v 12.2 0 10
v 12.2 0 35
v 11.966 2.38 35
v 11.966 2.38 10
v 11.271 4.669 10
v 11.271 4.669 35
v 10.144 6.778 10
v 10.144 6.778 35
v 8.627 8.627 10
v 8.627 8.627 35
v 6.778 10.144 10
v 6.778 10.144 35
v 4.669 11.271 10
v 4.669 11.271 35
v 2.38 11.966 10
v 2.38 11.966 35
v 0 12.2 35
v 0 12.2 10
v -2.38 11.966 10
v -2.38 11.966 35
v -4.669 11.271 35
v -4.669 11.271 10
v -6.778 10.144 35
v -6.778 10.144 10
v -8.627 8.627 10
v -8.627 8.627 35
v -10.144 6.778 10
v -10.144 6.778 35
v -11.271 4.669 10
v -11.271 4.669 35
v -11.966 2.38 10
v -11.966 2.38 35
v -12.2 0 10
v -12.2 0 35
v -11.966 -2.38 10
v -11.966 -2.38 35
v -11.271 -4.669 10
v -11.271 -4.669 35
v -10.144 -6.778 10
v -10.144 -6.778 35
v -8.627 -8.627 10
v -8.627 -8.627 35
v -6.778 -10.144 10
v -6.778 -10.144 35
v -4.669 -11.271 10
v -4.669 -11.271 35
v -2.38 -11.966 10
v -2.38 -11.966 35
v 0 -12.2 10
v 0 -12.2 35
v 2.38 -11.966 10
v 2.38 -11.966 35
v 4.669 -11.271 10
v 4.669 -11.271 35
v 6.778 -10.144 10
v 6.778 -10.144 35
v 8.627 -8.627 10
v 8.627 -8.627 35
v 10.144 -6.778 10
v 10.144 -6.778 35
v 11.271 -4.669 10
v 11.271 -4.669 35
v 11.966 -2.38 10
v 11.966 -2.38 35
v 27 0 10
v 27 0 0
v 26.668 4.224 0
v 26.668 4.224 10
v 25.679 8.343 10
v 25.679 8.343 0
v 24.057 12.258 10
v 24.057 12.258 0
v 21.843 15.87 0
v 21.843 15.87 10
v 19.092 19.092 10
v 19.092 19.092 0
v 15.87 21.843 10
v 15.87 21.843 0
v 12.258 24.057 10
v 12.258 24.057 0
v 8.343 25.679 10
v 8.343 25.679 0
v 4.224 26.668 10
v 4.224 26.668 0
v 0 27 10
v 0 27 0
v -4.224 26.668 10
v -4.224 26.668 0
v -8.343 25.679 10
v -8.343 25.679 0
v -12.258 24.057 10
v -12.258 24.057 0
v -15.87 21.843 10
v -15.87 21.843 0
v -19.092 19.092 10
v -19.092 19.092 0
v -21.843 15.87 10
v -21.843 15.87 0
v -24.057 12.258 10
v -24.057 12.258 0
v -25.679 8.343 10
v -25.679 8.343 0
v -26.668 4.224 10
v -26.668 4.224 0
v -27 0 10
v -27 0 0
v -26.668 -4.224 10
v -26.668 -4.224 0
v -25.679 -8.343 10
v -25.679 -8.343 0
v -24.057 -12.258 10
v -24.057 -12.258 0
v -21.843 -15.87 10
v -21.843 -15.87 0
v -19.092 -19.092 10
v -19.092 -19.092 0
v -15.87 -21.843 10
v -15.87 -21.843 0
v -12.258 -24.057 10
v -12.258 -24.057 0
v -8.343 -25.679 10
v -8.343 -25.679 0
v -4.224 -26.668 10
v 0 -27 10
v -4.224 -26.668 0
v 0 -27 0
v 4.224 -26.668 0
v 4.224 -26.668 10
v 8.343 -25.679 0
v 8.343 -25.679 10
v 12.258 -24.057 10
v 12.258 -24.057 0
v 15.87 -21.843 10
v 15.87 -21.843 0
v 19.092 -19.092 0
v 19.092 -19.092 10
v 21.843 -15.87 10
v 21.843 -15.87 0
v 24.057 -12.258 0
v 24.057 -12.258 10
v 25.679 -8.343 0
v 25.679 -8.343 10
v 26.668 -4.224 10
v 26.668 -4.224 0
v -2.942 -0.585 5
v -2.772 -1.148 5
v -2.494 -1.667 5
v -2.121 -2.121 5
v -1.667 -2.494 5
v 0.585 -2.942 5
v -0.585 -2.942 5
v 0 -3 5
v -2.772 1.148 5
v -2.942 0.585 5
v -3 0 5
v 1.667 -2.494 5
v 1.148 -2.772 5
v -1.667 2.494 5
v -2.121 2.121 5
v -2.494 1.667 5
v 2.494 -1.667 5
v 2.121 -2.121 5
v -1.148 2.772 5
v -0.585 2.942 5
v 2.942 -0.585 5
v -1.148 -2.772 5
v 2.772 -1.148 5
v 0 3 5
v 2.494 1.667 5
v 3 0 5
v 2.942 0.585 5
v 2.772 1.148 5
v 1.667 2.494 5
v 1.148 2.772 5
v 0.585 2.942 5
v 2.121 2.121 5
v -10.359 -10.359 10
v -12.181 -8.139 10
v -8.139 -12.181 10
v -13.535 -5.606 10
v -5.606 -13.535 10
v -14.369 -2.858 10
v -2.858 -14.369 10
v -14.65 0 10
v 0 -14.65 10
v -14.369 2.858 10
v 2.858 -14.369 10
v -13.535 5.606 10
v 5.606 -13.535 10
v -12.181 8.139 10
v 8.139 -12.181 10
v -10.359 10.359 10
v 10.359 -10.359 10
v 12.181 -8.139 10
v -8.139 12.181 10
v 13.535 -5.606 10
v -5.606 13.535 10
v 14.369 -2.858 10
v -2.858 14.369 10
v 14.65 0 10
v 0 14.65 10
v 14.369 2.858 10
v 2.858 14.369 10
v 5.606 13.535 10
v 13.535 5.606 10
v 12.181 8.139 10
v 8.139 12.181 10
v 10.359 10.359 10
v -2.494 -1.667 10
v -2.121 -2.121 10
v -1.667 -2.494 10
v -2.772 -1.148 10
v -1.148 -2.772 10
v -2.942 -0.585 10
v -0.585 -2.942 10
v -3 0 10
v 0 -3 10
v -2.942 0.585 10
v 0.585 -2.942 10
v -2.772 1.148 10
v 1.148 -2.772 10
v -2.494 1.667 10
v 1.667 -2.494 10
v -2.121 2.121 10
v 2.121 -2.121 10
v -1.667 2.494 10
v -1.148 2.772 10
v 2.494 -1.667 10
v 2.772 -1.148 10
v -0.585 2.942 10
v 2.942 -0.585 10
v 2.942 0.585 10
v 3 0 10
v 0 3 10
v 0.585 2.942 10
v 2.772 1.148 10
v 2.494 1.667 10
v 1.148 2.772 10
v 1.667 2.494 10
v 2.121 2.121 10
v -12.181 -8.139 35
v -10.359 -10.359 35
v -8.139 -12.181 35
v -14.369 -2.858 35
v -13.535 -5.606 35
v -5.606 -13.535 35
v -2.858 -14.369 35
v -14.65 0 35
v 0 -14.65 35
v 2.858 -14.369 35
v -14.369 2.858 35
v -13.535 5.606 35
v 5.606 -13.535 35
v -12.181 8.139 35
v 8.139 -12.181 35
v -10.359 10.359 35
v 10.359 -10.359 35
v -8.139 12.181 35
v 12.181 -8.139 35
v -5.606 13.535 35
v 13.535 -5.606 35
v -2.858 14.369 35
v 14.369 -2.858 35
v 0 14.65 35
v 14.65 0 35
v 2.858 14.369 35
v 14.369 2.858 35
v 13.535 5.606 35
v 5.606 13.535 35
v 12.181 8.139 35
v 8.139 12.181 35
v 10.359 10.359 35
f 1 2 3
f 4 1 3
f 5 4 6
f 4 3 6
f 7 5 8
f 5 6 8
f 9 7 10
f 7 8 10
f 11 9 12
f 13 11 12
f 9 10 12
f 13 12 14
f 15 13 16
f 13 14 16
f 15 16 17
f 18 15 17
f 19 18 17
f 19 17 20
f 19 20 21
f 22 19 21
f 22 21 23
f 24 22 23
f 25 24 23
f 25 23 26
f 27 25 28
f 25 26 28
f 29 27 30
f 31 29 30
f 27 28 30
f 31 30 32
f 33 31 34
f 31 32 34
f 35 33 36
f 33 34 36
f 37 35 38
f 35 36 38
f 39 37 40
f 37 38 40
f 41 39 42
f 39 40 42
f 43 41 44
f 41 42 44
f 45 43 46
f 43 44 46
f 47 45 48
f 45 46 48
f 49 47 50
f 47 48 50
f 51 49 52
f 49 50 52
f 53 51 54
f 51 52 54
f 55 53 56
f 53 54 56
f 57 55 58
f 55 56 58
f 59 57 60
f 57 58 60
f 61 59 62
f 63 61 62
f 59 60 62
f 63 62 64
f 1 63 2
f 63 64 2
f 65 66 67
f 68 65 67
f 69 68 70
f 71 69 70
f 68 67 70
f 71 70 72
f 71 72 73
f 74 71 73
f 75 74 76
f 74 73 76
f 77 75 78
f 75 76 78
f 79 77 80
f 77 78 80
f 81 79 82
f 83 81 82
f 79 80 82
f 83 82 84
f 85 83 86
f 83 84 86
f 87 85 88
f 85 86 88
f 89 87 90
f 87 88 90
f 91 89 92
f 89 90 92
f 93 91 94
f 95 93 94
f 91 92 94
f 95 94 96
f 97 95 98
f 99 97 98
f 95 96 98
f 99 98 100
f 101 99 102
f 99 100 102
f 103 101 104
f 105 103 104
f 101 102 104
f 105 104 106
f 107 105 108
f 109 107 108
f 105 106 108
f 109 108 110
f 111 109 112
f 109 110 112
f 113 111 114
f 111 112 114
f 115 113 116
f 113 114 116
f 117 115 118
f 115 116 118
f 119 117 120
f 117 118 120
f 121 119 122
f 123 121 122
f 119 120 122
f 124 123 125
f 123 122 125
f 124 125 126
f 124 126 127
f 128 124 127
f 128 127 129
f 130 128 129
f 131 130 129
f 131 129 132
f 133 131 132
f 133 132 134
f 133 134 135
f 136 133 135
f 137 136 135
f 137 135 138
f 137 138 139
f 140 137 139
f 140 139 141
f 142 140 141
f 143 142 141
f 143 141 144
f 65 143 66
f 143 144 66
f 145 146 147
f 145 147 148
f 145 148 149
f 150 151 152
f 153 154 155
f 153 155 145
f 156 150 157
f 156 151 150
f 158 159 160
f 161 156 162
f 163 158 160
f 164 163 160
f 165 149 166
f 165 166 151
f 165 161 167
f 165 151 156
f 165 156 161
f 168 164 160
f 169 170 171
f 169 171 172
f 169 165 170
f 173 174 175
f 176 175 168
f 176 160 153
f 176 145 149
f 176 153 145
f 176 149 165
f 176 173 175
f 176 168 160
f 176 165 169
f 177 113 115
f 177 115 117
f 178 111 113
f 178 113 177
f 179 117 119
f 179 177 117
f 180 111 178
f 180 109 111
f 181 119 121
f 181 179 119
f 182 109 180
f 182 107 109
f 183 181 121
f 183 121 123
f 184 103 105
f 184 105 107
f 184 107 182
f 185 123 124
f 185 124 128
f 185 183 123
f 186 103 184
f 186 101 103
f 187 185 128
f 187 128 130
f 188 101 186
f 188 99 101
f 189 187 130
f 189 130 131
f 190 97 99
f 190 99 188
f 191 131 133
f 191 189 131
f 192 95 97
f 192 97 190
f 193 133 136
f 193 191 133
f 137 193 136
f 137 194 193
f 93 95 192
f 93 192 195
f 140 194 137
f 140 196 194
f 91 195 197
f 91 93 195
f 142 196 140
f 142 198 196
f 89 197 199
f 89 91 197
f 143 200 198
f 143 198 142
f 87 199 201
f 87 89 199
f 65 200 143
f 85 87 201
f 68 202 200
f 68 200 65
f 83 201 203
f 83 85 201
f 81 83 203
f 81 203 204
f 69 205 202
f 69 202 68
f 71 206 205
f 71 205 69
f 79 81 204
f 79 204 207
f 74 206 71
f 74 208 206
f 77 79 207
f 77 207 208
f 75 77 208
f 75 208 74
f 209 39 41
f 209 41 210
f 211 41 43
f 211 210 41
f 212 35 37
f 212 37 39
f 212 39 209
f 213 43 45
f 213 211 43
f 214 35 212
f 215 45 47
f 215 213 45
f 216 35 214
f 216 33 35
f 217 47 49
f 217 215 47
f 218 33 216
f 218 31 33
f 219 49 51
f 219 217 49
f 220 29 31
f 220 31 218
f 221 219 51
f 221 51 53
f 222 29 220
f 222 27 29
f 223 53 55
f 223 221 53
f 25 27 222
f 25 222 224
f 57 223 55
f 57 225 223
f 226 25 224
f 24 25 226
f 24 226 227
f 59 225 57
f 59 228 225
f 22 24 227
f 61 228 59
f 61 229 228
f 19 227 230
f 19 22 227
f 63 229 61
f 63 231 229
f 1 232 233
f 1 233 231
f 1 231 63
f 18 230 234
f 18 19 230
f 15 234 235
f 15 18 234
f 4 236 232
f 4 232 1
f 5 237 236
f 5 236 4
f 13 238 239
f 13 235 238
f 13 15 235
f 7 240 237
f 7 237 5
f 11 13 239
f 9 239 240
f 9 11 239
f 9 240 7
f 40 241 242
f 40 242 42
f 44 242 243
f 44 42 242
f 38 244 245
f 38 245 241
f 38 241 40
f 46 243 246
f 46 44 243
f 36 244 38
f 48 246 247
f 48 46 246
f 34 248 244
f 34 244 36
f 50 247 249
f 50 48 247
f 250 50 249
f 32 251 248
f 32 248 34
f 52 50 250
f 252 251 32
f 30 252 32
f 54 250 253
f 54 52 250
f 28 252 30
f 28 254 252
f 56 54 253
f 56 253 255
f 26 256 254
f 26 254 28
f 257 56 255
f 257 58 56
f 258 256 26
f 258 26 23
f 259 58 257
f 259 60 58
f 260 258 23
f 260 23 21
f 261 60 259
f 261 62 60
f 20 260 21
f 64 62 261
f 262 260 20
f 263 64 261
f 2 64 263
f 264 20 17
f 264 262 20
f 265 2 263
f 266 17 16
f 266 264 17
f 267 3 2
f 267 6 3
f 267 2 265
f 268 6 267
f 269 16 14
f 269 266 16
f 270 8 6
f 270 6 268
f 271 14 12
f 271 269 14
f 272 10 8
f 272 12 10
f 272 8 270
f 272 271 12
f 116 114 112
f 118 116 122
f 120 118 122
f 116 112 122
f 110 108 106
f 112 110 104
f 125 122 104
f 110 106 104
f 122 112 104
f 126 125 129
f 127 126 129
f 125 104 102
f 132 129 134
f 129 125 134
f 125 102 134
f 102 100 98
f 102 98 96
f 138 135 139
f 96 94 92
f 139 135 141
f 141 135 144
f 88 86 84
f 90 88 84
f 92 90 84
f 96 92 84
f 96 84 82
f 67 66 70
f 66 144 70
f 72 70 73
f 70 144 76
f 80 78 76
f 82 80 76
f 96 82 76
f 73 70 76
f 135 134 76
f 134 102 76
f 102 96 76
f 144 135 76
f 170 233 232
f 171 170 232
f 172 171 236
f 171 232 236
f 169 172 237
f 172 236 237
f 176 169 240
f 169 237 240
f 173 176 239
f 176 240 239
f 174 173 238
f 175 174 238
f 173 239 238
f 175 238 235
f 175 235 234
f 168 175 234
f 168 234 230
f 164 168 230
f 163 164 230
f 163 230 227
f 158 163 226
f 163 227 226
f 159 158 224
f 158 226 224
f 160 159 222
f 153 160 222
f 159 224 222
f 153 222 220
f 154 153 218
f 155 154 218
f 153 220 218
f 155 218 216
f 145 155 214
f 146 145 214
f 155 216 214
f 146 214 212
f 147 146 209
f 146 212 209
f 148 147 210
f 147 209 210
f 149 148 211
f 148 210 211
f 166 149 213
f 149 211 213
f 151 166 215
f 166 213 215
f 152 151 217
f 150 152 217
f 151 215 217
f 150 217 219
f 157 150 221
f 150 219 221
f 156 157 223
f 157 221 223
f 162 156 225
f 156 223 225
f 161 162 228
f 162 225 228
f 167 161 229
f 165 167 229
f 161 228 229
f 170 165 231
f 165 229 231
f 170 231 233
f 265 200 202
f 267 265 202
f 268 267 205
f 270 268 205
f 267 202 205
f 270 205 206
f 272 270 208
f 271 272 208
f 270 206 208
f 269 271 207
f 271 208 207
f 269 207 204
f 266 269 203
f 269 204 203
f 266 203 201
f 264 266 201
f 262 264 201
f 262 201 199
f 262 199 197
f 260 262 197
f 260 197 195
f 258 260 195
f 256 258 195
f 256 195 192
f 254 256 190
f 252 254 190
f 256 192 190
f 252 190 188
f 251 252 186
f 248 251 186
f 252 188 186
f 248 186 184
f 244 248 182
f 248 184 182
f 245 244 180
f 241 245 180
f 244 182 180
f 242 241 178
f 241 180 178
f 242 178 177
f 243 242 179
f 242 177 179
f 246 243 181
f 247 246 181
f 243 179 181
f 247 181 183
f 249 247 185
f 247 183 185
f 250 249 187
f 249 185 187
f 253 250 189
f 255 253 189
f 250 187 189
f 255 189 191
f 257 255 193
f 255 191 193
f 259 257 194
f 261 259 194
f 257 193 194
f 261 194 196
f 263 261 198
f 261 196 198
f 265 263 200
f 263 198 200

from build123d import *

# Parameters (mm, degrees)
F0_R     = 27
F1_DEPTH = 10
F2_R     = 14.65
F3_DEPTH = 25
F4_R     = 12.2
F5_DEPTH = 25
F6_R     = 3
F7_DEPTH = 5


with BuildPart() as f1:
    # F0 (on Top) → F1 (new body)
    with BuildSketch(Plane.XY):
        Circle(F0_R)
    extrude(amount=F1_DEPTH)

    # F2 (on face) → F3 (join)
    with BuildSketch(Plane.XY.offset(10)):
        Circle(F2_R)
    extrude(amount=F3_DEPTH)

    # F4 (on face) → F5 (cut)
    with BuildSketch(Plane.XY.offset(35)):
        Circle(F4_R)
    extrude(amount=-F5_DEPTH, mode=Mode.SUBTRACT)

    # F6 (on face) → F7 (cut)
    with BuildSketch(Plane.XY.offset(10)):
        Circle(F6_R)
    extrude(amount=-F7_DEPTH, mode=Mode.SUBTRACT)


solid = f1.part
